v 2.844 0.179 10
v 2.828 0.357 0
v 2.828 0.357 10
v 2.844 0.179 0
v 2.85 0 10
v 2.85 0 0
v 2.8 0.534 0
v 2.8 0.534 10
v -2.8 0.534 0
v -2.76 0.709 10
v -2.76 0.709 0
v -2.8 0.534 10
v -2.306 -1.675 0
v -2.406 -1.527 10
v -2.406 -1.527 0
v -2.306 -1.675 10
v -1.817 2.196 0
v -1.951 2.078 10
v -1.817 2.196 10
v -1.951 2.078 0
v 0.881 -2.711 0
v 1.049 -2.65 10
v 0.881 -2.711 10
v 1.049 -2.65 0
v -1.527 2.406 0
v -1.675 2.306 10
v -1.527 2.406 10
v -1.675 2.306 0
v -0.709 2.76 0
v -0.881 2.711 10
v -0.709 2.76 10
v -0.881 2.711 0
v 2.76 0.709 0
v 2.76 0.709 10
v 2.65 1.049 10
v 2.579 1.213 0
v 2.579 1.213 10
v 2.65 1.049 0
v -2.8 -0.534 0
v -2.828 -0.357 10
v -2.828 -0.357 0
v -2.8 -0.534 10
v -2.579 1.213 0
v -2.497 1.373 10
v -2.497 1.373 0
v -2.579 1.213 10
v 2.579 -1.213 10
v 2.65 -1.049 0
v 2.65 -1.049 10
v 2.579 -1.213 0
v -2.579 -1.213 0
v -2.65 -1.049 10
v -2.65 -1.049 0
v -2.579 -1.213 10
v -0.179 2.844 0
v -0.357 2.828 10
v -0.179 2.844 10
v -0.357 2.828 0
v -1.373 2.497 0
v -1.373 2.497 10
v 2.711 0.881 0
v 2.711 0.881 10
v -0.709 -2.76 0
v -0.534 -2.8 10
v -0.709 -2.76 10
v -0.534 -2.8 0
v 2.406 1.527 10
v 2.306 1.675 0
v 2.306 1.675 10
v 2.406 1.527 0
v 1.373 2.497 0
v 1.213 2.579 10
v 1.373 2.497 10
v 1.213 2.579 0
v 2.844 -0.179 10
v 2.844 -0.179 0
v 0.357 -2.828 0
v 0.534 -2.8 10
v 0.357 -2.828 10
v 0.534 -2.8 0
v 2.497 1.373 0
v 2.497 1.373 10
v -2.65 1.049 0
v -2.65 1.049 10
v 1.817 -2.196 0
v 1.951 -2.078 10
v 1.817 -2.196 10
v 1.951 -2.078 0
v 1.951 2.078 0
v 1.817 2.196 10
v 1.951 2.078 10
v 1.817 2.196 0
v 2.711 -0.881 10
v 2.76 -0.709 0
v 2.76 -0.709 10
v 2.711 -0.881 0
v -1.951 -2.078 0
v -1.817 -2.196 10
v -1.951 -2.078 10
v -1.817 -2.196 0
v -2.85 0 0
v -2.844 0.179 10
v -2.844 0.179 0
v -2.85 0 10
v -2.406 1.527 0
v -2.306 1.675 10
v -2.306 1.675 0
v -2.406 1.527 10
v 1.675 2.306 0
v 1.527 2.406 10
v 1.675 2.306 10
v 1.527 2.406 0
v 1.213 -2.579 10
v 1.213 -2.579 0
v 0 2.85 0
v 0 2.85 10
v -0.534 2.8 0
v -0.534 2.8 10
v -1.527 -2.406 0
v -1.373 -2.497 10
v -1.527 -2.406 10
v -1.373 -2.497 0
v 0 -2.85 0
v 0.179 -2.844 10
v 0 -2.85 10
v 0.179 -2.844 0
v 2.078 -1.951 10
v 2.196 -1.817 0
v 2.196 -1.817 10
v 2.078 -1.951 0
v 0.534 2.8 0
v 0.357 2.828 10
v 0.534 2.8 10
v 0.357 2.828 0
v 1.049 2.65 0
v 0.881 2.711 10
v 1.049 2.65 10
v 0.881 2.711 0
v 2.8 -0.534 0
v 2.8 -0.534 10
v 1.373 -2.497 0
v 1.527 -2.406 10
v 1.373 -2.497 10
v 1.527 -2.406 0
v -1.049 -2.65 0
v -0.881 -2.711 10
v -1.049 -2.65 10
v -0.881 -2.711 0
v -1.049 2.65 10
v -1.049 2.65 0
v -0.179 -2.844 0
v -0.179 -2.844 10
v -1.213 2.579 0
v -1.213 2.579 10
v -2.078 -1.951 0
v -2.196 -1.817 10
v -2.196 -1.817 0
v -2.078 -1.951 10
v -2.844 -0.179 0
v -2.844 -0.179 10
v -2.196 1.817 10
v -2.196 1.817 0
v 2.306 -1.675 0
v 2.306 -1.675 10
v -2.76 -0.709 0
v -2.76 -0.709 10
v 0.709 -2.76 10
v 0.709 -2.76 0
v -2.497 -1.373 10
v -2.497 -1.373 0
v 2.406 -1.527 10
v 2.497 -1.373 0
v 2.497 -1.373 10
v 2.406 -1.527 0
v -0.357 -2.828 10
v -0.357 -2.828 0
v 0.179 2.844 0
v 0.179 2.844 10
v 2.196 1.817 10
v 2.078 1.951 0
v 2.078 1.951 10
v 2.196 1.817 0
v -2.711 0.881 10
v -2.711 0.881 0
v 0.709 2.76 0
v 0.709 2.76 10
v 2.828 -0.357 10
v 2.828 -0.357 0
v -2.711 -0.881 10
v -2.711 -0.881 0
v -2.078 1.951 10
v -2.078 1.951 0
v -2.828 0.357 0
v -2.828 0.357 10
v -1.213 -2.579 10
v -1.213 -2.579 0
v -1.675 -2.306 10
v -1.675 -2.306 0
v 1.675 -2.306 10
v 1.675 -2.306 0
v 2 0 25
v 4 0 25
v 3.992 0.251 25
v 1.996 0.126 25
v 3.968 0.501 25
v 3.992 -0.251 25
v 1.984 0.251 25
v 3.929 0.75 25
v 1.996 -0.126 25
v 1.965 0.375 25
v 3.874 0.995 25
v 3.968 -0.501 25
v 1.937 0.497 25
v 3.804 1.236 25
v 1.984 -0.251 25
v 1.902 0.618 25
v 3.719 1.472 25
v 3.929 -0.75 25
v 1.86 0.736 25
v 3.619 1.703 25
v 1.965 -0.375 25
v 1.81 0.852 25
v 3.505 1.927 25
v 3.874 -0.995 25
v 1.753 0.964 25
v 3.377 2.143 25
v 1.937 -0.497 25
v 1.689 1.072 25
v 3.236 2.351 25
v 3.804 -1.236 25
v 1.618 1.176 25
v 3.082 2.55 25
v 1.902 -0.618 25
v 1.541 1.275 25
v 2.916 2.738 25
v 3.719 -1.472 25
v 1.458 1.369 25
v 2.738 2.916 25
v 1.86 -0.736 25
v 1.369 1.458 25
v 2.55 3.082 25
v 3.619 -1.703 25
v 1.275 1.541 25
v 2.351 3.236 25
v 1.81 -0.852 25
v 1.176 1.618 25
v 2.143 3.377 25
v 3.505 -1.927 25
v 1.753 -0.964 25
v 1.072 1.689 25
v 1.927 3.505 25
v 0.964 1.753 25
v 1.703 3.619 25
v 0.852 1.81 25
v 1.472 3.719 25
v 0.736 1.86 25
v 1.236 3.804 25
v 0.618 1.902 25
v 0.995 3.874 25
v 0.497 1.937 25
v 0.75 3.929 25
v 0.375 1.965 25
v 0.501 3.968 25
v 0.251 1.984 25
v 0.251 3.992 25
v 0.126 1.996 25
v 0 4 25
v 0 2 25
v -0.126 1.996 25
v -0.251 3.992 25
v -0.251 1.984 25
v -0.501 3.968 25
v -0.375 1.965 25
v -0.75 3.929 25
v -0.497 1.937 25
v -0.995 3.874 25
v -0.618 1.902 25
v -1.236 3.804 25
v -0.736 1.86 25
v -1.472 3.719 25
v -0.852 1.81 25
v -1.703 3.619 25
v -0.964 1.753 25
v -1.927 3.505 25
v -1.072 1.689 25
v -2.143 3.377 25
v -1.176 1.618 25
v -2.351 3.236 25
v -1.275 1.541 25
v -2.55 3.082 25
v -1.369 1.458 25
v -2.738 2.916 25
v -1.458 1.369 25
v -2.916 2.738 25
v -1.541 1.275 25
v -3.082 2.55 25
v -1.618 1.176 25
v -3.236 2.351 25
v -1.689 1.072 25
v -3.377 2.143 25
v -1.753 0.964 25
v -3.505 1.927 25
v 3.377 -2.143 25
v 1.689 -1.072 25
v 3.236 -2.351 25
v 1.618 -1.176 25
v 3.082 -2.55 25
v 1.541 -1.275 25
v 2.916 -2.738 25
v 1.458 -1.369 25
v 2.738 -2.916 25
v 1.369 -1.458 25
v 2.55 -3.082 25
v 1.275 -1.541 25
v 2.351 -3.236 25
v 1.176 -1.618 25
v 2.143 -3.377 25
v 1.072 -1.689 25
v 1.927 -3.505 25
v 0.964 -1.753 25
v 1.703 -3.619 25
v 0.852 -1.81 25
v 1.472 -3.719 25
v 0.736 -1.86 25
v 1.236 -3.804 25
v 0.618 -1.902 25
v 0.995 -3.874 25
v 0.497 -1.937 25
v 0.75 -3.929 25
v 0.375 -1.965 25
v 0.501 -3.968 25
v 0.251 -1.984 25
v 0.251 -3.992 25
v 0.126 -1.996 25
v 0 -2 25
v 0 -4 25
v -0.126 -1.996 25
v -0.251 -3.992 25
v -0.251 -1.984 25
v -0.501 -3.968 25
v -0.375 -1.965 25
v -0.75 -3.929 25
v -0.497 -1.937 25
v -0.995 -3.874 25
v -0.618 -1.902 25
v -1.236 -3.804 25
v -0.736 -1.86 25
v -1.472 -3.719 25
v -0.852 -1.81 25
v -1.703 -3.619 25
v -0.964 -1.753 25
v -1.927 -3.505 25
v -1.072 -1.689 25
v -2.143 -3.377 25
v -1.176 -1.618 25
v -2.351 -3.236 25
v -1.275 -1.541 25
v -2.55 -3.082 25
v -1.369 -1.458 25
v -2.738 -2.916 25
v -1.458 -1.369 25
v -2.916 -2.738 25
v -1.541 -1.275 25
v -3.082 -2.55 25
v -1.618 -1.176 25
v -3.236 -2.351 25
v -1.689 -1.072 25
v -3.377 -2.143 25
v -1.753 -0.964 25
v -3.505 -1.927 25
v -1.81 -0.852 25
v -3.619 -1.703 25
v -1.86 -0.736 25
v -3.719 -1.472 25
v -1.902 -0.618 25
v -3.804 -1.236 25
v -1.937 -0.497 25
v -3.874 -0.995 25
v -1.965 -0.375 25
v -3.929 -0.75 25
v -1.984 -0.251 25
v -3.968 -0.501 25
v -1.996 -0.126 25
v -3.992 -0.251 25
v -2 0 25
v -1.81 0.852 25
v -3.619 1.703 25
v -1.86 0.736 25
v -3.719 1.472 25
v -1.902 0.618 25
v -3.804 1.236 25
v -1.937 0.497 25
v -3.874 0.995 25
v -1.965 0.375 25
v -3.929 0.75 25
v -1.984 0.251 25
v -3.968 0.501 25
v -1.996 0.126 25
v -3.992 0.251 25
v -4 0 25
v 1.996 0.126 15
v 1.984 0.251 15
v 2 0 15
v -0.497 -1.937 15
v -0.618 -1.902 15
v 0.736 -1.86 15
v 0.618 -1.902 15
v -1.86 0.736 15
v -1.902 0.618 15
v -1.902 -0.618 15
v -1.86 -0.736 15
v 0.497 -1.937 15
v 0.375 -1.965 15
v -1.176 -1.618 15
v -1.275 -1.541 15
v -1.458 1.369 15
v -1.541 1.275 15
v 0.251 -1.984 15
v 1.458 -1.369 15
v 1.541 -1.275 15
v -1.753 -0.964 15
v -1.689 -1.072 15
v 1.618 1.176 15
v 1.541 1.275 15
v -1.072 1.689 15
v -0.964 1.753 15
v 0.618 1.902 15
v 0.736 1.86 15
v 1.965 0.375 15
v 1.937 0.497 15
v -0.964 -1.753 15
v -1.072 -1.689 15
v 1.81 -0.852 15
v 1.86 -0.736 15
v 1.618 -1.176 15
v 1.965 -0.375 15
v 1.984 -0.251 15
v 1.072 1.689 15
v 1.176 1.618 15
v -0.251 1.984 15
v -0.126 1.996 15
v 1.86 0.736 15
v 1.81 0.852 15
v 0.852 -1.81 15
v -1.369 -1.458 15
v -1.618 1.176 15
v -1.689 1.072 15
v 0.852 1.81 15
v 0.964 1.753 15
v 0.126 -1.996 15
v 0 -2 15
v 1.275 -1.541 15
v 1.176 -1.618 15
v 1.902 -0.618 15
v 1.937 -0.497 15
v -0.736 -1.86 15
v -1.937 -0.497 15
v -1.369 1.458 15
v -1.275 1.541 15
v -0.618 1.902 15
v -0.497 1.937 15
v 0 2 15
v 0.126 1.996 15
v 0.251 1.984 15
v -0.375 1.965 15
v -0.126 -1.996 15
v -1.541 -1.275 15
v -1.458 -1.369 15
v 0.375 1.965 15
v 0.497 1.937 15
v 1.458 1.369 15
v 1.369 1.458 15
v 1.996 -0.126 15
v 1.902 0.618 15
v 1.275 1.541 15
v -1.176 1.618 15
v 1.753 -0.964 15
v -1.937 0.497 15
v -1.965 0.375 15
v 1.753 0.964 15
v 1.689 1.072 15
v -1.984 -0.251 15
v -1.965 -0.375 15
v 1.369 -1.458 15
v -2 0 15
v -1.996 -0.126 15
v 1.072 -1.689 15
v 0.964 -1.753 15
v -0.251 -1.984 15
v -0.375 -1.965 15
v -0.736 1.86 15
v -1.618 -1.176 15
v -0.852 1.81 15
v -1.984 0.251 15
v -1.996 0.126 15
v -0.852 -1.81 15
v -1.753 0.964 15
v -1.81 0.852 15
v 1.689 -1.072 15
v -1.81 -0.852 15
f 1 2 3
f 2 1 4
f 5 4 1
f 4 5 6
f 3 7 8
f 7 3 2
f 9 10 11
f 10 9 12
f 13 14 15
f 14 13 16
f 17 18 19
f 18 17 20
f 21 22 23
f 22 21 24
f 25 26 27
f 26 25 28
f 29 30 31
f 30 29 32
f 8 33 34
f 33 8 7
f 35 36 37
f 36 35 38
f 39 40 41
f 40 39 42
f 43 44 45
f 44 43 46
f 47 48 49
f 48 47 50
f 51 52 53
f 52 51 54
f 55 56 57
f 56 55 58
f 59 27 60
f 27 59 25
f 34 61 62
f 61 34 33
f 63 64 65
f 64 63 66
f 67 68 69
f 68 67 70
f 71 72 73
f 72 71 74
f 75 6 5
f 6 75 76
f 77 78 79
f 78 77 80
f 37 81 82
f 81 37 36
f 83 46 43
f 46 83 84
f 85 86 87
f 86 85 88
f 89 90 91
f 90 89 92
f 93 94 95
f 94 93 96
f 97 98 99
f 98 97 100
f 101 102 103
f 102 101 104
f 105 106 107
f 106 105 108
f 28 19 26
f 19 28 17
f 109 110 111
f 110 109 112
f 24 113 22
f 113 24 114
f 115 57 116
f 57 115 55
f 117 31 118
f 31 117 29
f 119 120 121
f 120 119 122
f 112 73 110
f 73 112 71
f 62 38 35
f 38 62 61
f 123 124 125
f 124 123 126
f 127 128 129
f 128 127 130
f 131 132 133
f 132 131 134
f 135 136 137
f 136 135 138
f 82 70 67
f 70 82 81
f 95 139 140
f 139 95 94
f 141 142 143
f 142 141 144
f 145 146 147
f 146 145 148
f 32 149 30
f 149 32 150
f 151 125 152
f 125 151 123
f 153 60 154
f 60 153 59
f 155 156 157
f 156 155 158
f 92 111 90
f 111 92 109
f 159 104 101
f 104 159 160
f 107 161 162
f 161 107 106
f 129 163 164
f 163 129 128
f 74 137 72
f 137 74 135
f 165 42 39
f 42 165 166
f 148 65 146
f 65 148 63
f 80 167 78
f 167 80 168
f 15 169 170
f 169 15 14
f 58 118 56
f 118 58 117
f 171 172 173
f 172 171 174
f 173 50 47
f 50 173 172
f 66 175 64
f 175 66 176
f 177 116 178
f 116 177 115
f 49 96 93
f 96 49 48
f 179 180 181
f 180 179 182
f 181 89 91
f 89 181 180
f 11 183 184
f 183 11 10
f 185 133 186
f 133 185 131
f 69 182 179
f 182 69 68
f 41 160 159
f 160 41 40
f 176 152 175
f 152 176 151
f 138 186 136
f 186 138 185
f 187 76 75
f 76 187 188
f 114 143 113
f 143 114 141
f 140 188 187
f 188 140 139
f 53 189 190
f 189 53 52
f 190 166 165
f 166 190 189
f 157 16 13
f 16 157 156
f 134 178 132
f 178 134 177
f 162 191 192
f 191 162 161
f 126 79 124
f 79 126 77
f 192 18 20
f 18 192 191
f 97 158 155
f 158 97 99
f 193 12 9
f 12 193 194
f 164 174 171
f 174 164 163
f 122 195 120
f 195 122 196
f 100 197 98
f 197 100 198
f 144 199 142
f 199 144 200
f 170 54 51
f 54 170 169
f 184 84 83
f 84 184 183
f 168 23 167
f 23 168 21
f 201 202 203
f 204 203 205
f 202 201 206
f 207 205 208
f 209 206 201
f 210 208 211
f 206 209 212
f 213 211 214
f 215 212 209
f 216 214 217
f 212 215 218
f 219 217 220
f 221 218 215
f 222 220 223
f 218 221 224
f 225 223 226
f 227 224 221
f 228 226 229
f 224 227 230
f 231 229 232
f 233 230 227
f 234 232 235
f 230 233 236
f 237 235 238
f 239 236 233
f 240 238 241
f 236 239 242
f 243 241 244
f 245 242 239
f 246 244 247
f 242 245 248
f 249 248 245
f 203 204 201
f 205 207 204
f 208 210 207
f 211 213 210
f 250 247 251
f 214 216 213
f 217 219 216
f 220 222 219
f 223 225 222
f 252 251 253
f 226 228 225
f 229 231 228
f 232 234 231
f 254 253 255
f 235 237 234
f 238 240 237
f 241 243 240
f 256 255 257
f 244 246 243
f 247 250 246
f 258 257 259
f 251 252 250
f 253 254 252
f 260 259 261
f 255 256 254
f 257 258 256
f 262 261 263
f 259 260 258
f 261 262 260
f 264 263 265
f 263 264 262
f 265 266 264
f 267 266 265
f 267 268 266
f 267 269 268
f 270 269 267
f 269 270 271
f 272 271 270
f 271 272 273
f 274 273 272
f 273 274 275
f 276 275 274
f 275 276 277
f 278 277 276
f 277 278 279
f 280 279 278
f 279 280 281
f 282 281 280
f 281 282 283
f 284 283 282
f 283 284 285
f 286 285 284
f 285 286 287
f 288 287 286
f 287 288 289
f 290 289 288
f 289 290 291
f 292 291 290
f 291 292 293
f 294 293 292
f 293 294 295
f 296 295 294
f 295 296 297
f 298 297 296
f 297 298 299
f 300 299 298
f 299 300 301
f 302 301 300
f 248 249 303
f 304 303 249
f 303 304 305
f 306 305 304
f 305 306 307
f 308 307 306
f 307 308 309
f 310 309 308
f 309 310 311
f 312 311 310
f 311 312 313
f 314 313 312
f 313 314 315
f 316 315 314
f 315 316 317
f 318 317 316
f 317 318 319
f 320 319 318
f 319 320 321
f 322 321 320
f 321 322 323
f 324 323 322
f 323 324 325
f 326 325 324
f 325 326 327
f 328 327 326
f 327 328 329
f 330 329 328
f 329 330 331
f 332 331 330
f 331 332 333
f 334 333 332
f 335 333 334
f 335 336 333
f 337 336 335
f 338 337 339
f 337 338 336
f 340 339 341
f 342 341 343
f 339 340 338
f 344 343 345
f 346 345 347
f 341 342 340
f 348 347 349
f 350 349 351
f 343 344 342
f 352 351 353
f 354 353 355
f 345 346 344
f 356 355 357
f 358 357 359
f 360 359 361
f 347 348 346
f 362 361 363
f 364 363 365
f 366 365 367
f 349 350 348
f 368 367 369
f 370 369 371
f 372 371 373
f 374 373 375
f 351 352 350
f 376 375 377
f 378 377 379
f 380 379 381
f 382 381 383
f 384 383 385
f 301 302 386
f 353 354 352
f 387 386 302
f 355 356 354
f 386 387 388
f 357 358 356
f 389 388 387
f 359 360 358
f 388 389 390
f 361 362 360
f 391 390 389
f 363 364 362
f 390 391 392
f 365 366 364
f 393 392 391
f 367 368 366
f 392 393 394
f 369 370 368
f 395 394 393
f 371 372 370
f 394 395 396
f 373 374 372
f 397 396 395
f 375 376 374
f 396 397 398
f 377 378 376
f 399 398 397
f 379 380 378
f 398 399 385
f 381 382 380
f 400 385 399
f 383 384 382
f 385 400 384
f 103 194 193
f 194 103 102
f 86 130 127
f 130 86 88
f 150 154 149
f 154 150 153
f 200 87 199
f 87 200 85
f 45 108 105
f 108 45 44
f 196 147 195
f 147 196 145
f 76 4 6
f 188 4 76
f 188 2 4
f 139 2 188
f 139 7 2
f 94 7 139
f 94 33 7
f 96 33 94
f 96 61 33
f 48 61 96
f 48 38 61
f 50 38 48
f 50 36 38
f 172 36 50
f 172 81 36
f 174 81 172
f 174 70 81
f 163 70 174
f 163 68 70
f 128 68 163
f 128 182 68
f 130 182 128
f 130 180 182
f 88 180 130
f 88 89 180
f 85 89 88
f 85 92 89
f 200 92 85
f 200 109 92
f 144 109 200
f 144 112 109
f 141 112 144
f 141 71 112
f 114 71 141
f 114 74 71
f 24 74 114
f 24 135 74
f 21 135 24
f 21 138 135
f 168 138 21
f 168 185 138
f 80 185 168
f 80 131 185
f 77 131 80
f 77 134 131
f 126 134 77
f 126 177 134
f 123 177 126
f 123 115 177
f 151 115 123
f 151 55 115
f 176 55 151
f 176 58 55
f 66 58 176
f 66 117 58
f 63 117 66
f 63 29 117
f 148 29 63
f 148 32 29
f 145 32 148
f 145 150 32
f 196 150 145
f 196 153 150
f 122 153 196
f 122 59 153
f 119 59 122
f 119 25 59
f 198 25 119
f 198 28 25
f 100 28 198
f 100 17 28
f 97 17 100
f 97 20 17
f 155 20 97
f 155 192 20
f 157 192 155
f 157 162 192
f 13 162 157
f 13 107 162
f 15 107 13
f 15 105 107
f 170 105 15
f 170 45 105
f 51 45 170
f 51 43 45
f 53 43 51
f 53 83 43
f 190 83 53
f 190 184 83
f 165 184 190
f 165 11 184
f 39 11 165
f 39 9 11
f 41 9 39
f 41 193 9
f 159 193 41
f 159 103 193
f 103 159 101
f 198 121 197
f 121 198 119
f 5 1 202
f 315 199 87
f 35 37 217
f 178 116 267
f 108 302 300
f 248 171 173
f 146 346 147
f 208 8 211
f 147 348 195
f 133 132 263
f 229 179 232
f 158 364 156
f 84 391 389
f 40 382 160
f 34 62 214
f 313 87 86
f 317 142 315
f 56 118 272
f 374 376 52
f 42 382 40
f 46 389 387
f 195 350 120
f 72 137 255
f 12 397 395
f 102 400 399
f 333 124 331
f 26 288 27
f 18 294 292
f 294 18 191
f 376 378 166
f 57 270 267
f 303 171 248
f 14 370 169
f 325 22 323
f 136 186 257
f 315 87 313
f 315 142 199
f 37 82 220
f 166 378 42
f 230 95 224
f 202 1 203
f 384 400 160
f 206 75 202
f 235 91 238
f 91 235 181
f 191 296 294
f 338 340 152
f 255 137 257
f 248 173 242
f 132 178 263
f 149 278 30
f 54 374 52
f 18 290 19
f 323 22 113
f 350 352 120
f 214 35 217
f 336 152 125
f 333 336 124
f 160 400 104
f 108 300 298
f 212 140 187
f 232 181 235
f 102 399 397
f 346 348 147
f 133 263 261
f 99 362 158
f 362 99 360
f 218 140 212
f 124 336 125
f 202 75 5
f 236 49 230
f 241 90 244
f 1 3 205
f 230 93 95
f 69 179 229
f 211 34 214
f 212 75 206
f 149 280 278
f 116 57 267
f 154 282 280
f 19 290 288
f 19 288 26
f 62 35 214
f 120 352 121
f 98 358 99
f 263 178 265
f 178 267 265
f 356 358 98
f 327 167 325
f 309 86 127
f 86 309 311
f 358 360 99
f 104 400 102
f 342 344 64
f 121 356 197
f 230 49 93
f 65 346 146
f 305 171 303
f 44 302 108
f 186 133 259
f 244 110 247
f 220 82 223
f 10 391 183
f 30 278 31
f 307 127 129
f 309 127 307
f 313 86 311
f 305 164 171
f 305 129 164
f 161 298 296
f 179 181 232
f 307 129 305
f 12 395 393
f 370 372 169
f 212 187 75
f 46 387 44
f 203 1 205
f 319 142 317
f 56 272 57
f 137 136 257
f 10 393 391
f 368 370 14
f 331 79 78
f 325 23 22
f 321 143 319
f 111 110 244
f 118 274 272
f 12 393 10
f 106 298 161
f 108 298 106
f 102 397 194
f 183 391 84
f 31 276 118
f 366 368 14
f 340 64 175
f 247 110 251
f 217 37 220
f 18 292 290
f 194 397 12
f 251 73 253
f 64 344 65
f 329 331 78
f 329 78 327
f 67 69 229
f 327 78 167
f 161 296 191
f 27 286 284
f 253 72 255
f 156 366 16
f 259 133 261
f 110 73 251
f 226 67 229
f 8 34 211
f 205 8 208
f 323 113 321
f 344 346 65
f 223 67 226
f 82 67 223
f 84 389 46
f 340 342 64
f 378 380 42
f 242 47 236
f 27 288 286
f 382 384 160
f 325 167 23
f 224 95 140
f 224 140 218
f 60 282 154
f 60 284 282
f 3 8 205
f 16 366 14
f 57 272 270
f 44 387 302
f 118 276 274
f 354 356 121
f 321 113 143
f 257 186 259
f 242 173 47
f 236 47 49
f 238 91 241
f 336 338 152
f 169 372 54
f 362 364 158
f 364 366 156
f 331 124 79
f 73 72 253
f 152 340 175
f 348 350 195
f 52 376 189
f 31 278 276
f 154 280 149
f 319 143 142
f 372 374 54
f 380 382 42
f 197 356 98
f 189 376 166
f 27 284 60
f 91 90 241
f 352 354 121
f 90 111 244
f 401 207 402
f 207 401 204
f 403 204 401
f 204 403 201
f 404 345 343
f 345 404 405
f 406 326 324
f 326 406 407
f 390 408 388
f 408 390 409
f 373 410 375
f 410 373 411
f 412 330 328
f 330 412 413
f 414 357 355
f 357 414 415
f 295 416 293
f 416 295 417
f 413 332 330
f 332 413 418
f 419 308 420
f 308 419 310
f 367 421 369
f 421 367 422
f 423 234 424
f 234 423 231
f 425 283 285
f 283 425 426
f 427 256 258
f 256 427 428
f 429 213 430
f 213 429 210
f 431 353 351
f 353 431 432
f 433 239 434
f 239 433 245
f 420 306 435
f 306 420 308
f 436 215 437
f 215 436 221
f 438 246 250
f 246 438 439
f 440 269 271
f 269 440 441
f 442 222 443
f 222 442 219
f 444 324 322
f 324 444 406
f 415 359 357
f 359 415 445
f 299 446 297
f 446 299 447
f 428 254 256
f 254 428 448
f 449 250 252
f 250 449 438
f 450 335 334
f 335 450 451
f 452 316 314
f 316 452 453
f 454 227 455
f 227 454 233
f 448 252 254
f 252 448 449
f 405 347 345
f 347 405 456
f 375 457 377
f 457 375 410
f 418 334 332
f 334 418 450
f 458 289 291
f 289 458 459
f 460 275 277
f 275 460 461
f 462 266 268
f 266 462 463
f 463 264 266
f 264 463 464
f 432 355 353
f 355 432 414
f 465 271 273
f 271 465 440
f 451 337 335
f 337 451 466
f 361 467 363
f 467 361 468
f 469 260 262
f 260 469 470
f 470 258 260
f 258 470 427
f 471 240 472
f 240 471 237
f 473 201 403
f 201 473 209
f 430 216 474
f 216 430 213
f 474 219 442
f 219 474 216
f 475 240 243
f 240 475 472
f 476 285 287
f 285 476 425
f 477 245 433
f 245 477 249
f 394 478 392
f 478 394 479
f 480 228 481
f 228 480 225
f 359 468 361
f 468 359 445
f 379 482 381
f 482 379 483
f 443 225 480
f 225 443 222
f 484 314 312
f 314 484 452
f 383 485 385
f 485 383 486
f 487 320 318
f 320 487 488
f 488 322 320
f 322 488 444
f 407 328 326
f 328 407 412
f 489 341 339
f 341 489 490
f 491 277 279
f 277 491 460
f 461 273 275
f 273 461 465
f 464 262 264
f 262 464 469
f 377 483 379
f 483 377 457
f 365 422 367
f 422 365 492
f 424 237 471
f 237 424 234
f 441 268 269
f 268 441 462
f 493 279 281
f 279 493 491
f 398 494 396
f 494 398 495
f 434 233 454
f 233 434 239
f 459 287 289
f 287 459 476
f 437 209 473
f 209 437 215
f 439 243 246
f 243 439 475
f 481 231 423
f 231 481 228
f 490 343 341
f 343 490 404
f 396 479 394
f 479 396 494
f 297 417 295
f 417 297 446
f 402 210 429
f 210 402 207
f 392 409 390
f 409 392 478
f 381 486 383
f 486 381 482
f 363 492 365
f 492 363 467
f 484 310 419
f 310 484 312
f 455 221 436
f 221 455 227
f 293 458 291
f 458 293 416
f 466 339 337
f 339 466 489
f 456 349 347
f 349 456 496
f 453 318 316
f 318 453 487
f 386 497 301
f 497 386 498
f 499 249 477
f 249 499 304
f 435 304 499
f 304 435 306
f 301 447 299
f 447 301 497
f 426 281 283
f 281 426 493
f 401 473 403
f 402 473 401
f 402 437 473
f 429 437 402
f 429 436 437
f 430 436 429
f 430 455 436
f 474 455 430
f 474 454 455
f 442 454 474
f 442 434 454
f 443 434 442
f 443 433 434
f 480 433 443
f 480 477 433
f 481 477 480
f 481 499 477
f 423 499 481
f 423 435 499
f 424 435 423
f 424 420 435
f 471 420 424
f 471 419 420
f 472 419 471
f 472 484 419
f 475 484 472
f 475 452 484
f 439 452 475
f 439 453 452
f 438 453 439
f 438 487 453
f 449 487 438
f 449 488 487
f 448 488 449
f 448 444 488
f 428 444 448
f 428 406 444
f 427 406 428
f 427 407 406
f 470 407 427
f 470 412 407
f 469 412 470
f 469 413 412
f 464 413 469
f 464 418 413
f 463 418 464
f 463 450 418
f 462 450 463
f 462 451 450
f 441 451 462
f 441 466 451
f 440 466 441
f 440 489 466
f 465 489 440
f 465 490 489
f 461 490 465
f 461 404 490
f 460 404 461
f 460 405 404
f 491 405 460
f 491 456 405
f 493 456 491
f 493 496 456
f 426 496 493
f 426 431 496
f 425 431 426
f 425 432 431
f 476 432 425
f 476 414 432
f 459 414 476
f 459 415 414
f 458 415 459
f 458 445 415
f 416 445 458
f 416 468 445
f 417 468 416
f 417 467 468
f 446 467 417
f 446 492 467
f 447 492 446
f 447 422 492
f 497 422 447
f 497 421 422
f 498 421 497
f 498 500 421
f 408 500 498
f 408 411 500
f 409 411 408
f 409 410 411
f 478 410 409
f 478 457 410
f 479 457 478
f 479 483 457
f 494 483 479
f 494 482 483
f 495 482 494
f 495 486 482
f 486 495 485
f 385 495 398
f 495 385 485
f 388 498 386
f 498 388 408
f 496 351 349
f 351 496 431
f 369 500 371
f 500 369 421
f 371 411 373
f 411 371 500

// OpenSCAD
$fn=100;
difference() {
    union() {
        cylinder(h=25, r=2.85);
        translate([0,0,10]) cylinder(h=15, r1=2.85, r2=4);
    }
    translate([0,0,15]) {
        color("red") cylinder(h=11, r=2);
    }
}
